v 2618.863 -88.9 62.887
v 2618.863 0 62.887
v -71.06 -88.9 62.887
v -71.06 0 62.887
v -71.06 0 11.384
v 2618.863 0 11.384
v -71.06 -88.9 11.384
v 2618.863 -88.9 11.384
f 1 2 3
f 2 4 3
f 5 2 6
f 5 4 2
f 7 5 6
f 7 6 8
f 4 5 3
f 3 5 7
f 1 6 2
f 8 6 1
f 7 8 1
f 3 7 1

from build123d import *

# Parameters (mm, degrees)
F1_W     = 251.5227198601
F1_H     = 13.4035423398
F2_DEPTH = 88.9
F3_DEPTH = 38.1
F4_DEPTH = 2438.4


# Not quite as in the source:
# - a feature of the source that left no trace in its solid (it failed there, or was rolled back) is left out


with BuildPart() as f2:
    # F1 (on face) → F2 (new body)
    with BuildSketch(Plane.XZ):
        with Locations((54.7012239695, 18.0854015052)):
            Rectangle(F1_W, F1_H)
    extrude(amount=F2_DEPTH)

    # F3 (add): a face of the model
    f3_faces = [f2.faces().sort_by_distance(p)[0] for p in [
        (54.7012239695, -44.45, 24.7871726751),
    ]]
    extrude(f3_faces, amount=F3_DEPTH)

    # F4 (add): a face of the model
    f4_faces = [f2.faces().sort_by_distance(p)[0] for p in [
        (180.4625838995, -44.45, 37.1354015052),
    ]]
    extrude(f4_faces, amount=F4_DEPTH)


solid = f2.part
